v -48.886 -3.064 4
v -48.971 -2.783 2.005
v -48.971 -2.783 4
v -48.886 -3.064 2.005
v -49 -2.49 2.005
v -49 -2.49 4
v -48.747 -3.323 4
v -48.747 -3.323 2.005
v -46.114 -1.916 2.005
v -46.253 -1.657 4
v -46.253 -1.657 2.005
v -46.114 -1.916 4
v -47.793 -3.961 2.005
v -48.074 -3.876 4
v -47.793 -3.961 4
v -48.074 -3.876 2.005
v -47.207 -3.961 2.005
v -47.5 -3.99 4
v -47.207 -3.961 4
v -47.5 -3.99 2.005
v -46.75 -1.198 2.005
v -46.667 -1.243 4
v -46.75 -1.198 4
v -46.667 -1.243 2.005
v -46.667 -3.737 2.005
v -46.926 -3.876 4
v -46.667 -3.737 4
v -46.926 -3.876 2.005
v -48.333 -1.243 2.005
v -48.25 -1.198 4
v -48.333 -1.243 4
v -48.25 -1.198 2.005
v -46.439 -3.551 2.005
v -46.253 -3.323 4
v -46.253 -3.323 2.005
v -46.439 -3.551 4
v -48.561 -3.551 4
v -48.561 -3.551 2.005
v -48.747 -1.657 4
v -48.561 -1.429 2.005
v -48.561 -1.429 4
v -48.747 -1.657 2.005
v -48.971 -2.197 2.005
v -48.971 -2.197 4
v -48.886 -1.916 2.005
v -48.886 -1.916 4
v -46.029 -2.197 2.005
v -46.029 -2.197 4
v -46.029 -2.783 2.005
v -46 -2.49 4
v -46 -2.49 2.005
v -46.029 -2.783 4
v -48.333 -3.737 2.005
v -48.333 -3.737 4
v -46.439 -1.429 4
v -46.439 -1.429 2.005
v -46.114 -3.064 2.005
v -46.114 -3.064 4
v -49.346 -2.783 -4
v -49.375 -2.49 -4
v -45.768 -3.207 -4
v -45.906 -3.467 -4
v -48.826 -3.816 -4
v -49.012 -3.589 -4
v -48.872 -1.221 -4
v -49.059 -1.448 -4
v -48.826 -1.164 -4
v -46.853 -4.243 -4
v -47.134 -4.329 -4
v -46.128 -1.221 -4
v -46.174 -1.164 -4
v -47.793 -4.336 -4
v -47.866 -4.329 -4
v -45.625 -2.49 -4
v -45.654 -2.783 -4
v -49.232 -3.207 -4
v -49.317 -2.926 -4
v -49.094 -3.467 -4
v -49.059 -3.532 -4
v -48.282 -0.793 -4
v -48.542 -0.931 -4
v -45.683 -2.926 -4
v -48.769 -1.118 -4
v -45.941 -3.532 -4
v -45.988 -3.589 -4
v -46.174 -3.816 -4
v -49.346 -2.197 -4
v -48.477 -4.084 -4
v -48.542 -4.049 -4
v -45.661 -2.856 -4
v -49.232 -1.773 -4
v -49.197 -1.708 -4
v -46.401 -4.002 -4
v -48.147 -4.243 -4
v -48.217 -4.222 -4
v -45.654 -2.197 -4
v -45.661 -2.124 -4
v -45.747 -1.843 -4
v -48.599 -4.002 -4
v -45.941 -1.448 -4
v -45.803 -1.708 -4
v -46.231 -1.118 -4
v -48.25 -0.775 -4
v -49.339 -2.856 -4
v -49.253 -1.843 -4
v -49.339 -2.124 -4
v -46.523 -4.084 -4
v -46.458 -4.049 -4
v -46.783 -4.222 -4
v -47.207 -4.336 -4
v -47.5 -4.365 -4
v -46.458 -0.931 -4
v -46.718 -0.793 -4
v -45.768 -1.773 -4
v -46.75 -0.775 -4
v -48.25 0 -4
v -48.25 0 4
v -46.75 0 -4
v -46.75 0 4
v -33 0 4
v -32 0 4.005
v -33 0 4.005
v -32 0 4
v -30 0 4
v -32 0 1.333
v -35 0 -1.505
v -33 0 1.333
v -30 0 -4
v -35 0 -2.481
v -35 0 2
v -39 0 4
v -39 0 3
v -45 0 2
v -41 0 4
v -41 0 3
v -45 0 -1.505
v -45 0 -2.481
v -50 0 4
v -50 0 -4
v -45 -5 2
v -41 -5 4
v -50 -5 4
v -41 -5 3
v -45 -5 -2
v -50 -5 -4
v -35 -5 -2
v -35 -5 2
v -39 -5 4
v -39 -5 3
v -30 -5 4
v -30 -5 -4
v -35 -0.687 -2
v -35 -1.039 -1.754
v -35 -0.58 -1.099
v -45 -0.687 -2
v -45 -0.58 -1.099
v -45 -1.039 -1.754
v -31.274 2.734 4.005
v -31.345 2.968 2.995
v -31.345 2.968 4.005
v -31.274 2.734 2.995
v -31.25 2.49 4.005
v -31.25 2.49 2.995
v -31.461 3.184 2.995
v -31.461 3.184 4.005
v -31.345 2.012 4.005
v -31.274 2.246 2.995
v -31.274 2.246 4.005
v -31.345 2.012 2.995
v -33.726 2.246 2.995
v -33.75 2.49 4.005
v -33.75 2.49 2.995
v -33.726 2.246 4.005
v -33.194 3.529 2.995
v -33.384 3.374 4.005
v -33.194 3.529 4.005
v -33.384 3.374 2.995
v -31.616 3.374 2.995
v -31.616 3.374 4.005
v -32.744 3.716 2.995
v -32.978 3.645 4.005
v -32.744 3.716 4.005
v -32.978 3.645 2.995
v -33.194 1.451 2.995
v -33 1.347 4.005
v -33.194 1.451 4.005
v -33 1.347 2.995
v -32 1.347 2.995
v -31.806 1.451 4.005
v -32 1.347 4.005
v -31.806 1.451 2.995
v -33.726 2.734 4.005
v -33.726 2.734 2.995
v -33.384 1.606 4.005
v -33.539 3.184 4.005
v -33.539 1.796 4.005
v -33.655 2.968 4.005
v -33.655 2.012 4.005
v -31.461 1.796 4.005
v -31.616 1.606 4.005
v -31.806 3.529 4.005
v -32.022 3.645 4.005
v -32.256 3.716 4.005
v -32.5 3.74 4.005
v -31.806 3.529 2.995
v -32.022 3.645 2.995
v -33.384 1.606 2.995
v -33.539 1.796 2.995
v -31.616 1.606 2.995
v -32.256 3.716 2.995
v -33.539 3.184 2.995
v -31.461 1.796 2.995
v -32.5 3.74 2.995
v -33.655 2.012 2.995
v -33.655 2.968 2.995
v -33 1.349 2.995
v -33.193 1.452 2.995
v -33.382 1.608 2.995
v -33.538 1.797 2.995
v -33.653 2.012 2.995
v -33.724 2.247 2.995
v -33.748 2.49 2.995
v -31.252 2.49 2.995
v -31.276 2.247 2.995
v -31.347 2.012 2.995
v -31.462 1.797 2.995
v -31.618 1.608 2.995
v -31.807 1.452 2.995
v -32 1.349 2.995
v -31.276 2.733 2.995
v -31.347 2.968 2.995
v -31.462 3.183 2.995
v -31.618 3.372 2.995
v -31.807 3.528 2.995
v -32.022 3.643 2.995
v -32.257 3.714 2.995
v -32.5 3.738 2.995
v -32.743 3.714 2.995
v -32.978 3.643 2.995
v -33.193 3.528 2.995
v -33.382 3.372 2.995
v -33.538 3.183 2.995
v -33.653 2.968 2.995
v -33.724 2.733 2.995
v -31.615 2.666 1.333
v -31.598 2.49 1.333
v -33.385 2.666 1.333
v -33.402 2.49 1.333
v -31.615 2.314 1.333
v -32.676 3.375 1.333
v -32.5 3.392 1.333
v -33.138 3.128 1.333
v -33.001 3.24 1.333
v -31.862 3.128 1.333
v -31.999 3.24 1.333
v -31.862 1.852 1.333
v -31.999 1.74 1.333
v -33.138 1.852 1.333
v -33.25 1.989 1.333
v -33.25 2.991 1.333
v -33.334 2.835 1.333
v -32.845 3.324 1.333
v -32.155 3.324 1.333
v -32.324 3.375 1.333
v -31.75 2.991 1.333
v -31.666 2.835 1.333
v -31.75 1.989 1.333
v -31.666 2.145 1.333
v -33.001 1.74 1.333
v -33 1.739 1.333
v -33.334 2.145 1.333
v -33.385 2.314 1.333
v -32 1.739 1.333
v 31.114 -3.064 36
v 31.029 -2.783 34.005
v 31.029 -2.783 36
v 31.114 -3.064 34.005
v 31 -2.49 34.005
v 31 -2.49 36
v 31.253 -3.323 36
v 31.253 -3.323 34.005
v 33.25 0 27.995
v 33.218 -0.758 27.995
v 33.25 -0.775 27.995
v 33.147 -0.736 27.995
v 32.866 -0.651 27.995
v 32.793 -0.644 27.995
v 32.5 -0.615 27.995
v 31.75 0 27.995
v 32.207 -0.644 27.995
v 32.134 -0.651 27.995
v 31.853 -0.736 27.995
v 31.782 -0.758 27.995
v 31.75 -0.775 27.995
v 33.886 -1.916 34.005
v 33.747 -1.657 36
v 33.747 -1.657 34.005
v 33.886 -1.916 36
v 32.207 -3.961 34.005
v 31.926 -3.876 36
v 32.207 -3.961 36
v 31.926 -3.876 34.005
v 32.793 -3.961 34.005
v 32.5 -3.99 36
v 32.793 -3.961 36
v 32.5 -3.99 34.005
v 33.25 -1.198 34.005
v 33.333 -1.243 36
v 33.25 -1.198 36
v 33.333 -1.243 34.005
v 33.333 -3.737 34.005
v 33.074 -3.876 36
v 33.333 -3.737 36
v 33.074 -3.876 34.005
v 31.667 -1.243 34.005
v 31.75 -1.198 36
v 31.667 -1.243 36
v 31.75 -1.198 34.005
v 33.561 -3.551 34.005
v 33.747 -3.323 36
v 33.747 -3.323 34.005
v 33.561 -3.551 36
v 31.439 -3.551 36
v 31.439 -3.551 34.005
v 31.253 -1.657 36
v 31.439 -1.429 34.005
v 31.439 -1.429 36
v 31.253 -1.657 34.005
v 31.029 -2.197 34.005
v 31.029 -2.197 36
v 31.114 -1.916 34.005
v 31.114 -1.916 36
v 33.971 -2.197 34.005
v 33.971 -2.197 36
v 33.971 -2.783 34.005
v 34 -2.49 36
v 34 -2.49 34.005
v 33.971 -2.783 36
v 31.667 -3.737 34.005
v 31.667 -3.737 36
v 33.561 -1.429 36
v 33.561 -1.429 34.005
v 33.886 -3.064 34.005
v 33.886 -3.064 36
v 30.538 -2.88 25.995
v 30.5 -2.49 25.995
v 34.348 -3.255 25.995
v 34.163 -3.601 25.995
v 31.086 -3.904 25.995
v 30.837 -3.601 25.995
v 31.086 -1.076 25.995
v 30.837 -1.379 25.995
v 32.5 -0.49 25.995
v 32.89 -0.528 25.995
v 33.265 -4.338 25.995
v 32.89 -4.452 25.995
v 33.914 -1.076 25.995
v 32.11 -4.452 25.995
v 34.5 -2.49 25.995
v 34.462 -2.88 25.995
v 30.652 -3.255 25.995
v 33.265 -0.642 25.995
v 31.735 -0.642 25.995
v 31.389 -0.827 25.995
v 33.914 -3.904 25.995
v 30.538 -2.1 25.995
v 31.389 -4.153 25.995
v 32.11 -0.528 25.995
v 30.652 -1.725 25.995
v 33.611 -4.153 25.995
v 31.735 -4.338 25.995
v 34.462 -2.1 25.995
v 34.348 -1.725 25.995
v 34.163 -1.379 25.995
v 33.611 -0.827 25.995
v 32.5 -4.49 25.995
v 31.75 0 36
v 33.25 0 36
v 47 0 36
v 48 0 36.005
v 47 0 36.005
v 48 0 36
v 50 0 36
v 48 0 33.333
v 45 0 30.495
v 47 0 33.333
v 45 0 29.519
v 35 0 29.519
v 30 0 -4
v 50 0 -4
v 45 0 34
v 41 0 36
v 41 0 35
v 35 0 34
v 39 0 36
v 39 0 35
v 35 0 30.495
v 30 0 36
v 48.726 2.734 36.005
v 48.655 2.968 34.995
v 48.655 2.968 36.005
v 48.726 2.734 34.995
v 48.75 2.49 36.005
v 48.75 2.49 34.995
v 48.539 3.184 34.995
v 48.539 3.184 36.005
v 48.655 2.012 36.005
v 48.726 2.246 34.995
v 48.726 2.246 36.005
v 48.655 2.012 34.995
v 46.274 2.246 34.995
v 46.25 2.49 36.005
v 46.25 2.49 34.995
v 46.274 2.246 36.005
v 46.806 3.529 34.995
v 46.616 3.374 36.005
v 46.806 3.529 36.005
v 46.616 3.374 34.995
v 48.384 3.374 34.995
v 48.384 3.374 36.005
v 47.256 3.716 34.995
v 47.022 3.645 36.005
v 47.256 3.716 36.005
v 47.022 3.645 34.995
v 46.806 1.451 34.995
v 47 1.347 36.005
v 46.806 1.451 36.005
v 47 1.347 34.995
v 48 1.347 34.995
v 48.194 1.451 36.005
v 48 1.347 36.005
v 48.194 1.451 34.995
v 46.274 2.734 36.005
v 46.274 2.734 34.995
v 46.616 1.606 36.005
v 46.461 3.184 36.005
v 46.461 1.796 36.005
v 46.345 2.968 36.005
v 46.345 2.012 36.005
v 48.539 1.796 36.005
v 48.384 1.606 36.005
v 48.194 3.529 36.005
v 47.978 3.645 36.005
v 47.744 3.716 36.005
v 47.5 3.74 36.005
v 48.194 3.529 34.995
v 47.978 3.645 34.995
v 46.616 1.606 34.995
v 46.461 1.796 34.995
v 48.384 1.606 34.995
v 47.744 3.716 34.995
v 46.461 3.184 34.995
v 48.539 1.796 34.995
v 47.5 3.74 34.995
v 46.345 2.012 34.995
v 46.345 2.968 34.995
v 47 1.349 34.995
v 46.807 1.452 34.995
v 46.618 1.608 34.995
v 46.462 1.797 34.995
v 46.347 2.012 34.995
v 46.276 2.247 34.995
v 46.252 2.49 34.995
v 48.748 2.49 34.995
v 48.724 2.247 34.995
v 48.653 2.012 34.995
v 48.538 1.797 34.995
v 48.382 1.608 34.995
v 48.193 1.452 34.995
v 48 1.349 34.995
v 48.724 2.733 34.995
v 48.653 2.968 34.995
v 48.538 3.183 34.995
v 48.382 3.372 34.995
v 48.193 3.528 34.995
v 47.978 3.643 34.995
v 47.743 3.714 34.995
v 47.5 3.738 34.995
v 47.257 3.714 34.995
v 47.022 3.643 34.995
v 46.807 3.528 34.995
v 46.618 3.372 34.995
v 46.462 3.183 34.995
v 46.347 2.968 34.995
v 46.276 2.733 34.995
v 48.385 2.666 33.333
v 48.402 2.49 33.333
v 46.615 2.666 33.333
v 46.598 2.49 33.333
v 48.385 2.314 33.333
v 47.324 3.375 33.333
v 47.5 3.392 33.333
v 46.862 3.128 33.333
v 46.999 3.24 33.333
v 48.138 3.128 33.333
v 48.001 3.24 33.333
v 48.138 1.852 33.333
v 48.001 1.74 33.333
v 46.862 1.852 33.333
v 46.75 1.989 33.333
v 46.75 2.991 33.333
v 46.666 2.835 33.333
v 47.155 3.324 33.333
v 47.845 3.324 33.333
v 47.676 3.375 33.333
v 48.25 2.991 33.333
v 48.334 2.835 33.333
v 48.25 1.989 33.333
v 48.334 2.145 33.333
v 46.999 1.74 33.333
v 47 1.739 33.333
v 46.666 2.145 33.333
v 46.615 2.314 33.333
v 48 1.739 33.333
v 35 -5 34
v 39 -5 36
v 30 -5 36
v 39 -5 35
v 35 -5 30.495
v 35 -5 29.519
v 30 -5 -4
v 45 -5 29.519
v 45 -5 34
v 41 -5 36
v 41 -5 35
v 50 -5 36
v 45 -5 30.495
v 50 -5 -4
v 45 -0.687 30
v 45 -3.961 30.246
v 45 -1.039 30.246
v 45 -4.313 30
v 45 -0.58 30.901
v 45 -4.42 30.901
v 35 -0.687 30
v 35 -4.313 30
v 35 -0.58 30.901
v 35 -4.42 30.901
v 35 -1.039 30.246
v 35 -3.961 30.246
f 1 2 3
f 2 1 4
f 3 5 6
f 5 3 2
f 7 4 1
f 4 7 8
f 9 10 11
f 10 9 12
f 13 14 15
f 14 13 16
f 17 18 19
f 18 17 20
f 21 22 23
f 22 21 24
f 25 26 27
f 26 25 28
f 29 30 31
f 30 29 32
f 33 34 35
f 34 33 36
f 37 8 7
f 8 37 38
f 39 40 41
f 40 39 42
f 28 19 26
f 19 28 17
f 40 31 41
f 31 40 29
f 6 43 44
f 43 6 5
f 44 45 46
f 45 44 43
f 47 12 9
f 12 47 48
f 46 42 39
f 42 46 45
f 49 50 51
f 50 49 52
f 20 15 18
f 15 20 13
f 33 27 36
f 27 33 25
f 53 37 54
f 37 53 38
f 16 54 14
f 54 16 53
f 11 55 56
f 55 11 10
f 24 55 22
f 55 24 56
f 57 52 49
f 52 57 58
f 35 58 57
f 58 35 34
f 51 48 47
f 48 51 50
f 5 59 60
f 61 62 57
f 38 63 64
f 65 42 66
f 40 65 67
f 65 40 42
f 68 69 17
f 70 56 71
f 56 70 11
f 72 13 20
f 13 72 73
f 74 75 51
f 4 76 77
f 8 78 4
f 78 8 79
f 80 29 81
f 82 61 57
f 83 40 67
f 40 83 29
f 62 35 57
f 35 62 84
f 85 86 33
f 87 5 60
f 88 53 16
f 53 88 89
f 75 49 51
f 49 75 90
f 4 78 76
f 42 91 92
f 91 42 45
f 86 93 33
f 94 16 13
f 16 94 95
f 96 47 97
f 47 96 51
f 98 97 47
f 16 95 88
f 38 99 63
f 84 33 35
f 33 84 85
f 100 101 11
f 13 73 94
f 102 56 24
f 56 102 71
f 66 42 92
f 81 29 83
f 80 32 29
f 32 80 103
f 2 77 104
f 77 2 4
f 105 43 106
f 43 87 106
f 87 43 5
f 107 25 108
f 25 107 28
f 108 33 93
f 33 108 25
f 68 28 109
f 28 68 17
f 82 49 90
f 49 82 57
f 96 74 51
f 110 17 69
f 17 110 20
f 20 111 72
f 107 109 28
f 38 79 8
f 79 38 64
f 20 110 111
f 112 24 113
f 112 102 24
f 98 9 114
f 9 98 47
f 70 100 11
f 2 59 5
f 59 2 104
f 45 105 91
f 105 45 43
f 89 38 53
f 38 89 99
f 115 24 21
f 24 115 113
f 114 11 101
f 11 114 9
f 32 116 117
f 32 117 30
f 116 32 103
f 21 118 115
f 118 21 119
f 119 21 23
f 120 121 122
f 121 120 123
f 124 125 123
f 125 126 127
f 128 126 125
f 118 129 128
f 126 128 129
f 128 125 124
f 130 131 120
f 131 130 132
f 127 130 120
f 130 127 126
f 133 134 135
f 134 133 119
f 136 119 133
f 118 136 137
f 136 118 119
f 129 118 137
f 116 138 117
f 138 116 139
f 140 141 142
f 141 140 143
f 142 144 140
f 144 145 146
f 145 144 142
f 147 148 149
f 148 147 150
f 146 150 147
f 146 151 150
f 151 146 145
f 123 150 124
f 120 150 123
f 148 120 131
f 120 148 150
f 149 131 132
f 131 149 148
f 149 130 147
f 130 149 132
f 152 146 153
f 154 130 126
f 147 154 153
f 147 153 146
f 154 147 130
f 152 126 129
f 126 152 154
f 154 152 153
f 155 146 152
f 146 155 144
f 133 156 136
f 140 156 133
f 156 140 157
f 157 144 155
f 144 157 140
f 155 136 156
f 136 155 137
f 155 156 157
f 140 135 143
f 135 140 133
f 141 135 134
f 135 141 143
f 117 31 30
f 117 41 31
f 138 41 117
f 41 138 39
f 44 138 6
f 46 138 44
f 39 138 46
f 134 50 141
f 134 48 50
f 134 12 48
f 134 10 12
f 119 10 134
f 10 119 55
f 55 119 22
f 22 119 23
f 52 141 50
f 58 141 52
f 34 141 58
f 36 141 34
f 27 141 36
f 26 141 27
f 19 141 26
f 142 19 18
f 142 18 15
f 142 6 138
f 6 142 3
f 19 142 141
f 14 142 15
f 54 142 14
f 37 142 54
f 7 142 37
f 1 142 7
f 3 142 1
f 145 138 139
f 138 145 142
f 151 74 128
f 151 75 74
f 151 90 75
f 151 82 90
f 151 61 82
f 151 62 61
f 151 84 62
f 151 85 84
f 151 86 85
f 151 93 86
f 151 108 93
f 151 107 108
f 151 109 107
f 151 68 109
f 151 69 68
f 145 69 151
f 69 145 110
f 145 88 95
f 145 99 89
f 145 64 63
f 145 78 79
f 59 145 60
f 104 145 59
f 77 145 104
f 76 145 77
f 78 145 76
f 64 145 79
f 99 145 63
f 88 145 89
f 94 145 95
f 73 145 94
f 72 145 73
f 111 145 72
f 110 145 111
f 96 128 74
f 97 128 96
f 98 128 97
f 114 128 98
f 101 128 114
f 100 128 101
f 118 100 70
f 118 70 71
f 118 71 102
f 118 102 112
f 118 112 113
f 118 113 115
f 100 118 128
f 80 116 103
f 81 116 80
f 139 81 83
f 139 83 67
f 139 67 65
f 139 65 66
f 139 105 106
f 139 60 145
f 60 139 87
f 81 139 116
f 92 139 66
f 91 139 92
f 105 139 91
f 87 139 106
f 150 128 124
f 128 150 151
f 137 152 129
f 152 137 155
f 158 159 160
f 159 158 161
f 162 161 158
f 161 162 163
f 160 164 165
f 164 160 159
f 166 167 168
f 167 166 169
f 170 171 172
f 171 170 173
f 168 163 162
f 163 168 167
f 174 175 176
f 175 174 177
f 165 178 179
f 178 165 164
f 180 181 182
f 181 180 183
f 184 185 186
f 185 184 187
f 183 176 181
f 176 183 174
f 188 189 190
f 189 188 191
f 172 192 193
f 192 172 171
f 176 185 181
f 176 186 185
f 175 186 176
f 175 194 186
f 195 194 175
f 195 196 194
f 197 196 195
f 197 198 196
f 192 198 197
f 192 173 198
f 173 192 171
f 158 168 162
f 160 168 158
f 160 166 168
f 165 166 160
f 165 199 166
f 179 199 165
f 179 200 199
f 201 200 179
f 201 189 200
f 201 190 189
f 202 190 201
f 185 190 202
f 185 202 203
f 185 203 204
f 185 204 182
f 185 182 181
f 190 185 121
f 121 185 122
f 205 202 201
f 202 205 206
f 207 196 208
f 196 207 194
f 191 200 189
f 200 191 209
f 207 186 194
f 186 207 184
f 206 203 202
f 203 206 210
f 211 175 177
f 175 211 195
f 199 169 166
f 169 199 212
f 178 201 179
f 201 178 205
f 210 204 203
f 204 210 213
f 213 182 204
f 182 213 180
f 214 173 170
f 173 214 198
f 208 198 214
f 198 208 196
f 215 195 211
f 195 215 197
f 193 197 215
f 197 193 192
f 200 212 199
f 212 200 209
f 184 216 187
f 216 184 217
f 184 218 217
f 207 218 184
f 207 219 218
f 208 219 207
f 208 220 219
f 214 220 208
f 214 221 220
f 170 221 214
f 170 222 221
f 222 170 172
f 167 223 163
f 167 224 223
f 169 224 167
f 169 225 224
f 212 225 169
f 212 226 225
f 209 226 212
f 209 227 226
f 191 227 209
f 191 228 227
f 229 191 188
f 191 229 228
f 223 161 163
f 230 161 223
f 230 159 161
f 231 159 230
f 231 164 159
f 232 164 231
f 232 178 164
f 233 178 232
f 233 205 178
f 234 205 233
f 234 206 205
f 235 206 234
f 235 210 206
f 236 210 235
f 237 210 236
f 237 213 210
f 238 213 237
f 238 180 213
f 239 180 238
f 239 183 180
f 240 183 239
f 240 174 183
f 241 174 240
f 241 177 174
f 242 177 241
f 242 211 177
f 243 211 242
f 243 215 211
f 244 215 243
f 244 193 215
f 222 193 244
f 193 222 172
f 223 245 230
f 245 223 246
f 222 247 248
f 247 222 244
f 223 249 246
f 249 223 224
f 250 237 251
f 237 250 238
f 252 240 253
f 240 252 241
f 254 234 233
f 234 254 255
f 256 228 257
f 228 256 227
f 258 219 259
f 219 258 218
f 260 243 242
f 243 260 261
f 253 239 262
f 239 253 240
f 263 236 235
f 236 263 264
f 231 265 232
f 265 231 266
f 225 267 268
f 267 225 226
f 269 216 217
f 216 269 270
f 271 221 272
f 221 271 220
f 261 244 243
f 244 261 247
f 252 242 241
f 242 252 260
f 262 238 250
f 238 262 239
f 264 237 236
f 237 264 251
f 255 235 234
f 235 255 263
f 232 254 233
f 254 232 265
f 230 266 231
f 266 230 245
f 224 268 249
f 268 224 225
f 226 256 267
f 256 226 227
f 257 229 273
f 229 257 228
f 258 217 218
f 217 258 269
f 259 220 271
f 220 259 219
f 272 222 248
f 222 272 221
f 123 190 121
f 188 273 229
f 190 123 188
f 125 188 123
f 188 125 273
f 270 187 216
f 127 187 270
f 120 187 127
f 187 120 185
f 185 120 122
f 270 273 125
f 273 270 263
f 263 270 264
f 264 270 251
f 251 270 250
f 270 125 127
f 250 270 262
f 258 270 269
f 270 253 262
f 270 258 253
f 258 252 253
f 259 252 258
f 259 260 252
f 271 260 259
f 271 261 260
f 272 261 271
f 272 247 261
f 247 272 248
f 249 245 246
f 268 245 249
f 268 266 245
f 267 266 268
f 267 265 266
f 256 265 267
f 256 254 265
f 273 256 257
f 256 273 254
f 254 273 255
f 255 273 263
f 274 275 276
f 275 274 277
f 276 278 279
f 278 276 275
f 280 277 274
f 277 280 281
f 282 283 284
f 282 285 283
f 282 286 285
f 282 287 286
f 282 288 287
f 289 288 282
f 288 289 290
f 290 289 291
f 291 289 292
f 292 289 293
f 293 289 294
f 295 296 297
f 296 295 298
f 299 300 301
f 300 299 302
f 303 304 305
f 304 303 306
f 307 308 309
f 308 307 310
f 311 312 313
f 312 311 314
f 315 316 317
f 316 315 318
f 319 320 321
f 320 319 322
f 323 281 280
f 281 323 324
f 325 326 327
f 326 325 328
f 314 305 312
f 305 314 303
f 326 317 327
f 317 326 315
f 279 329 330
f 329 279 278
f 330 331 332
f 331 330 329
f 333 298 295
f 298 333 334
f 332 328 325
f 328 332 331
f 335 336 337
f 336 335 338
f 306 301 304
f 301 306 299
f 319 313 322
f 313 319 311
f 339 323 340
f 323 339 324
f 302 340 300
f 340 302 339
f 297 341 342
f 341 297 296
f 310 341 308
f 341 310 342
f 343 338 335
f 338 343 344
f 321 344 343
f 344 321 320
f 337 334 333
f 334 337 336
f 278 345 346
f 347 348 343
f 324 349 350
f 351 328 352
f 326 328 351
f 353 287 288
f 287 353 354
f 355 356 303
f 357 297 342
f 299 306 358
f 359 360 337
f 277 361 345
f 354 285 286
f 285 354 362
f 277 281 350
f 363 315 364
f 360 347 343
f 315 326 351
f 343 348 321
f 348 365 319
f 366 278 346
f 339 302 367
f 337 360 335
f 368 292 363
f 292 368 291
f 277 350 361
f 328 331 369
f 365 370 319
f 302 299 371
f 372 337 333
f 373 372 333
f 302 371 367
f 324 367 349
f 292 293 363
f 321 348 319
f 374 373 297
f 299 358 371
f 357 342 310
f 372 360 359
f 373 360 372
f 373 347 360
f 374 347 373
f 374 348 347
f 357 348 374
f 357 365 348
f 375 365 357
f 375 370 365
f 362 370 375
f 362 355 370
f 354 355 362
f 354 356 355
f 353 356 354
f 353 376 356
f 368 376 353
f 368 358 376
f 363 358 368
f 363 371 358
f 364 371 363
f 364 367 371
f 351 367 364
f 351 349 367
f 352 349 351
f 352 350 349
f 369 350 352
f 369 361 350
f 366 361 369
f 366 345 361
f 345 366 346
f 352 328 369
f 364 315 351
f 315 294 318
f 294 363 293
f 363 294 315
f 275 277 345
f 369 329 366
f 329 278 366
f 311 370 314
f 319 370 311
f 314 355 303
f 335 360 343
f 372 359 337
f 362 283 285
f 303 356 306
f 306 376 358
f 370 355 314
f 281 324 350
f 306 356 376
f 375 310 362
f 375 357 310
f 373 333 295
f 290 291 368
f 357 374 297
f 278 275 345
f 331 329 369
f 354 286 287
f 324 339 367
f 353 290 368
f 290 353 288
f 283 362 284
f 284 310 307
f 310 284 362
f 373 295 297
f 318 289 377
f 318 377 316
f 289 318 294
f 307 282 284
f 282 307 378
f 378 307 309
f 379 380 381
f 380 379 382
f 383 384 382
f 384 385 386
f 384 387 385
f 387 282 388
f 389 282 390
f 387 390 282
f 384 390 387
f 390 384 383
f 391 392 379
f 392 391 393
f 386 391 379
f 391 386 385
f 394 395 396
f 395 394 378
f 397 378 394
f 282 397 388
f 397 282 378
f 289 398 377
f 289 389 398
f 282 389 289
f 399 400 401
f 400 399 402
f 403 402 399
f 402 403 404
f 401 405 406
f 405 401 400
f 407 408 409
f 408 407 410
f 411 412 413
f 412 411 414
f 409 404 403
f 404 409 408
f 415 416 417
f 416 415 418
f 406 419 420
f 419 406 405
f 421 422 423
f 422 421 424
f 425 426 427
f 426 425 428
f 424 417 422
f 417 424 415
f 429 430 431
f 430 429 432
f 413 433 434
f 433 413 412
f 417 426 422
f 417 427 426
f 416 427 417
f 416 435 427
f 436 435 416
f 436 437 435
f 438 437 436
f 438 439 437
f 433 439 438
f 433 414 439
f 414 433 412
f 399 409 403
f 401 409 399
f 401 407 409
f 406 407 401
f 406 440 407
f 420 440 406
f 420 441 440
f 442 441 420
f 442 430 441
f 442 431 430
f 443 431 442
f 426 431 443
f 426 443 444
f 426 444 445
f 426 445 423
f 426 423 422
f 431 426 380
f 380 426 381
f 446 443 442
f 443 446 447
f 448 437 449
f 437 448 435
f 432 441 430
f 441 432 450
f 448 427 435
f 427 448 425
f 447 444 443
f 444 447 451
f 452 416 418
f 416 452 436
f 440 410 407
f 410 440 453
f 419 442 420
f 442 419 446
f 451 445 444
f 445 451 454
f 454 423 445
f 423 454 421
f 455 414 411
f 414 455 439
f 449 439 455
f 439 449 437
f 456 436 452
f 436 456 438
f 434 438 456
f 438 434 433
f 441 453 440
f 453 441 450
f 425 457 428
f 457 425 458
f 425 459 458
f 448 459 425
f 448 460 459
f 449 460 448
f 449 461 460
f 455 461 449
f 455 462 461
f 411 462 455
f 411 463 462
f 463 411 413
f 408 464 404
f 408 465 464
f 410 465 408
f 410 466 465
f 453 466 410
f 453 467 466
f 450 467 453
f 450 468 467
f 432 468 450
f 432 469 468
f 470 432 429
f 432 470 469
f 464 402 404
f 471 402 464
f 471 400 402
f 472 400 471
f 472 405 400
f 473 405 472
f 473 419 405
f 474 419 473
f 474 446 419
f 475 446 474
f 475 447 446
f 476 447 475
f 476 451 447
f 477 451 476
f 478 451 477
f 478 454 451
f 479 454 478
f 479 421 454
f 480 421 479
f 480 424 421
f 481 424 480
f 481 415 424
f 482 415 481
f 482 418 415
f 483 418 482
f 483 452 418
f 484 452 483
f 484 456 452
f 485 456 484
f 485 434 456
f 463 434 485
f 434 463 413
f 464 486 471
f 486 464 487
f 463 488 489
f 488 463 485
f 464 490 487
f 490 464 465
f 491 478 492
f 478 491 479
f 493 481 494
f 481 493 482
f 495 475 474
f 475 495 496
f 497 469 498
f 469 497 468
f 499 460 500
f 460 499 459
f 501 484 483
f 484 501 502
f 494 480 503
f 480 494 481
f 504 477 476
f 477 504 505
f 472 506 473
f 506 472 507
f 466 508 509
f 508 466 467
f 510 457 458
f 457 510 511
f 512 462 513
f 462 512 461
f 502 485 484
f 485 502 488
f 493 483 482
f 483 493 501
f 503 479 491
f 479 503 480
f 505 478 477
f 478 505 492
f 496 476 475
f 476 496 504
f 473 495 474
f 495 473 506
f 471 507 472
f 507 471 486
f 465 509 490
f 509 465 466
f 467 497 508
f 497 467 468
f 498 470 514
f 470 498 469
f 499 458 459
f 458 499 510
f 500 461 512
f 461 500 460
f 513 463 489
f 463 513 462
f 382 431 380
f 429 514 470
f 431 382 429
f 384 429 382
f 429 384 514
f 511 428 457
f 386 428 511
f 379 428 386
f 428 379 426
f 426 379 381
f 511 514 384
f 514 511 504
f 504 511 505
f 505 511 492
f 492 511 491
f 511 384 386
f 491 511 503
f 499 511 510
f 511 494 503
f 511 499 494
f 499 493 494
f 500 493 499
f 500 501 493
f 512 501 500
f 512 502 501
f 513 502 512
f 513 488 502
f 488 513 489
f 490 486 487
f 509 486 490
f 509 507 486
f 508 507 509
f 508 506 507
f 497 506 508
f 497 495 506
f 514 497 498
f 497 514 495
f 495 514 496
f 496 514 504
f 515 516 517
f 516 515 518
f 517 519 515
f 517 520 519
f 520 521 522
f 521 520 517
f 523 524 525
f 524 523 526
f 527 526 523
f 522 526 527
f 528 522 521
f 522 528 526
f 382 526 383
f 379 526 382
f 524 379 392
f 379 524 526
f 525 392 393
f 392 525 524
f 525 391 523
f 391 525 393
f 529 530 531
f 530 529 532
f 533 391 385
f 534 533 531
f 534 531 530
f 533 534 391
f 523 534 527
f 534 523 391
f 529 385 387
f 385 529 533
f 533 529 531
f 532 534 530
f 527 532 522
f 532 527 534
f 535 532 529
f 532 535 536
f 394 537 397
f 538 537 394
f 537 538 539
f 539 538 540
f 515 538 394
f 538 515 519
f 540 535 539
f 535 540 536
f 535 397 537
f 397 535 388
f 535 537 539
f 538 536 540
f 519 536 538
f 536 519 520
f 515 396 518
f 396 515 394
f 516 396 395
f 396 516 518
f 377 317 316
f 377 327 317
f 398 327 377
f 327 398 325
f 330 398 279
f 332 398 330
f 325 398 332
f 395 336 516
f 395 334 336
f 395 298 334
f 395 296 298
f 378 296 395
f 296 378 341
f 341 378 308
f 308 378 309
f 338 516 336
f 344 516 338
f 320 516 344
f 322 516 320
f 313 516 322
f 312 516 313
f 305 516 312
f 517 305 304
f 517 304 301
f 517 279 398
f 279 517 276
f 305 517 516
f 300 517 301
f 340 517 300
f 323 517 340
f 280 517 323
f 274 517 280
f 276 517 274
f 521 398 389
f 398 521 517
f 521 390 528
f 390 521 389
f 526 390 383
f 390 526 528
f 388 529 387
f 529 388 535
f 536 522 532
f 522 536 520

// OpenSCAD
/*

  ttt_curve180_ramp_3.scad

  (c) olikraus@gmail.com

  This work is licensed under the Creative Commons Attribution-NonCommercial-ShareAlike 4.0 International License. 
  To view a copy of this license, visit http://creativecommons.org/licenses/by-nc-sa/4.0/.

*/
include <train_tube_track.scad>;


ttt_curved180_ramp_3();
